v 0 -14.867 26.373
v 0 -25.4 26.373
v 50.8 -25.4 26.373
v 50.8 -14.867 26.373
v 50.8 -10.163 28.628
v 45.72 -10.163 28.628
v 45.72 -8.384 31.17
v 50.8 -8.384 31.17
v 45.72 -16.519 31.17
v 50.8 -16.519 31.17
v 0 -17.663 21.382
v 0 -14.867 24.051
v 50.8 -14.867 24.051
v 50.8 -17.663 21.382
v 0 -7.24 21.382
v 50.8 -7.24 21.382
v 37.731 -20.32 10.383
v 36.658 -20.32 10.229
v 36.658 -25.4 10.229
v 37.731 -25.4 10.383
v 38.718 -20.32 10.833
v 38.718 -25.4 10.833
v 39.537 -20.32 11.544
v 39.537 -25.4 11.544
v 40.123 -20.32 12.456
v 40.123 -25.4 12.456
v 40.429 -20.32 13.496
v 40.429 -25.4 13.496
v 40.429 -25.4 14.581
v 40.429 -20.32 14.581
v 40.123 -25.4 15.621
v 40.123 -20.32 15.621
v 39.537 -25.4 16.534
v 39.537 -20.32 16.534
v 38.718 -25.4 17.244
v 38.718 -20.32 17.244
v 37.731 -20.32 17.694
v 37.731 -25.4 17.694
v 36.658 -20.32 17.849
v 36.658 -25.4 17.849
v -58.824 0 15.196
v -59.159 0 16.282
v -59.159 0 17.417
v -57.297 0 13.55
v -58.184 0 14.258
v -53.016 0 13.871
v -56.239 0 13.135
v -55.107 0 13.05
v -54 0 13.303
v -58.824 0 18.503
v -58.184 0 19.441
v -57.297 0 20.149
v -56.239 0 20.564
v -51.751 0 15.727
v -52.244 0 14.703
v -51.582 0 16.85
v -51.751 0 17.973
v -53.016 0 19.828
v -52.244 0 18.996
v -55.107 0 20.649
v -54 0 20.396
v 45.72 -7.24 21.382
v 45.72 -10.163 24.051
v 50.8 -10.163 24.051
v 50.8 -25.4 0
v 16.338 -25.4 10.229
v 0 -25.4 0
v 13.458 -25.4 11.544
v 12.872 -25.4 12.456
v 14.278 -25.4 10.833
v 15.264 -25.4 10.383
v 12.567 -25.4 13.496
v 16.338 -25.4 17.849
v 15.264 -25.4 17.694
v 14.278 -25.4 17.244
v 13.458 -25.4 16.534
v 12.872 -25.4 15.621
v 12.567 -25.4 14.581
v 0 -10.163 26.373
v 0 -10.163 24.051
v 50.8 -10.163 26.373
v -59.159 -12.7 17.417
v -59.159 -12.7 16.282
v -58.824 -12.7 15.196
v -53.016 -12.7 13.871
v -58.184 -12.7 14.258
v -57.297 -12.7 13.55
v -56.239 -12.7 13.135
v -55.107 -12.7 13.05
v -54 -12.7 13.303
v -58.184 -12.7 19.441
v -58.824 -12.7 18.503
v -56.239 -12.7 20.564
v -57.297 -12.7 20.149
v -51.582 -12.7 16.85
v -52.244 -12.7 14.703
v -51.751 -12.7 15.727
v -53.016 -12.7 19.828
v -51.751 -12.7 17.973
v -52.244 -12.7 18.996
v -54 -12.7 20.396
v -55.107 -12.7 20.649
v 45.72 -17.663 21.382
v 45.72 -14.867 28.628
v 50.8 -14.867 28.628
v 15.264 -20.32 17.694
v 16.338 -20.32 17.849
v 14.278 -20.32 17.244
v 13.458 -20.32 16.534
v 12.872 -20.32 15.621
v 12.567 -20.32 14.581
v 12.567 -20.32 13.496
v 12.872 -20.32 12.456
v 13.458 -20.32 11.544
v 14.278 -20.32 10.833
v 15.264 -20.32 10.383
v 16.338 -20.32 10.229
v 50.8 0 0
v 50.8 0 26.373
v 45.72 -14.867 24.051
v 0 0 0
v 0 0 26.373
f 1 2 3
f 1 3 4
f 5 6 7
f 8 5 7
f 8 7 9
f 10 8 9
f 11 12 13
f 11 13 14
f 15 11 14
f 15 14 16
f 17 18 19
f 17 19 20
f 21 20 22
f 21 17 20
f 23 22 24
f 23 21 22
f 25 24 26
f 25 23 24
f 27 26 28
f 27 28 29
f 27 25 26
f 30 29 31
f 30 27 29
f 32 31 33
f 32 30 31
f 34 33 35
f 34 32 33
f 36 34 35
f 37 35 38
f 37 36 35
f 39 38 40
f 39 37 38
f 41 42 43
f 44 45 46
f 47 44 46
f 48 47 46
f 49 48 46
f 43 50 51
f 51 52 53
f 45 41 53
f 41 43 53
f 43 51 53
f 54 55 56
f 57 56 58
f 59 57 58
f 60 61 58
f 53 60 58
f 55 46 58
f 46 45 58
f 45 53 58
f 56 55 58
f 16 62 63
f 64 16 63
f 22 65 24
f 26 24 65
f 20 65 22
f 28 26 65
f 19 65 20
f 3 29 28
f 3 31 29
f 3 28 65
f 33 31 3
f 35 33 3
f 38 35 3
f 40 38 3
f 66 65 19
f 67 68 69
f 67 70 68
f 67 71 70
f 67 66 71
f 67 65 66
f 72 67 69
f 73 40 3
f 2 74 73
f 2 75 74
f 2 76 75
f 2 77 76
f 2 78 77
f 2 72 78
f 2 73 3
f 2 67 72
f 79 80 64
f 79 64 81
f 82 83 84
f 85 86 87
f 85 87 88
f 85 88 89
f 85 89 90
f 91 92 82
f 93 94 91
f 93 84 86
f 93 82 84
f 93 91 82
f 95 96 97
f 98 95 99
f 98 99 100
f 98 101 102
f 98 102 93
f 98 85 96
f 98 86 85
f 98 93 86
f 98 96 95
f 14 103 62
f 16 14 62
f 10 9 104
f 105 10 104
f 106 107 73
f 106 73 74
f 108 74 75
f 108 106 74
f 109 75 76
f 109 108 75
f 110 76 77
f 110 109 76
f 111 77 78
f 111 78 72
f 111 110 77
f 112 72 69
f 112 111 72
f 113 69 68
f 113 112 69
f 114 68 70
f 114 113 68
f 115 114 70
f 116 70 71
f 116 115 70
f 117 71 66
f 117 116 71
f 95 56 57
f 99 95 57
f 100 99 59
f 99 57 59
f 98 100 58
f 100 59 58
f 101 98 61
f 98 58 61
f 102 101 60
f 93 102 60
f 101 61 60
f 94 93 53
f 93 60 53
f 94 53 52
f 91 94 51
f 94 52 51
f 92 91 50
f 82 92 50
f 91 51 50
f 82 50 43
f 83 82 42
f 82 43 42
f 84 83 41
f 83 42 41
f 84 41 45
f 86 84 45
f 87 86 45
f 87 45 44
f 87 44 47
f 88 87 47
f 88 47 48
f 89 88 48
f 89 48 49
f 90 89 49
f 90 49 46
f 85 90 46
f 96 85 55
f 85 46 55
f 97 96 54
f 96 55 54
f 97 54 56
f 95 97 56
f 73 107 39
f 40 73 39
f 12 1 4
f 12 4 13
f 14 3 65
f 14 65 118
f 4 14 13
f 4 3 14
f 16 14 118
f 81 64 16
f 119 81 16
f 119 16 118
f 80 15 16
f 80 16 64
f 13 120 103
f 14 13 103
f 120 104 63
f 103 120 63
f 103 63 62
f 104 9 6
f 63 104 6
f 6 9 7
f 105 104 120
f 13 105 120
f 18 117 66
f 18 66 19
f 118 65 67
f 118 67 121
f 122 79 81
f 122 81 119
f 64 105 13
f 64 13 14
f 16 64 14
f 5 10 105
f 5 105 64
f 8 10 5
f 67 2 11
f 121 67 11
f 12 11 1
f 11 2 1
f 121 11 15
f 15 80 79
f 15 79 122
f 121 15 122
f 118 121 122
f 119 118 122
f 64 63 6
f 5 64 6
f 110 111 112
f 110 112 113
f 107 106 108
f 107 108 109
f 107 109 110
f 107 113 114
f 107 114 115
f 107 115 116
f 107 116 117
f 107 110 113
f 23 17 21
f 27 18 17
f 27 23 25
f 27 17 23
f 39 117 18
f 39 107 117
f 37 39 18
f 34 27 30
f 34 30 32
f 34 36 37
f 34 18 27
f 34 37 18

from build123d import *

# Parameters (mm, degrees)
F0_W     = 25.4
F0_H     = 26.373182479
F1_DEPTH = 50.8
F3_DEPTH = 50.8
F5_DEPTH = 45.72
F6_R     = 3.81
F7_DEPTH = 12.7
F8_W     = 20.32
F8_H     = 7.62
F9_DEPTH = 5.08


with BuildPart() as f1:
    # F0 (on Right) → F1 (new body)
    with BuildSketch(Plane.YZ):
        with Locations((-12.7, 13.1865912395)):
            Rectangle(F0_W, F0_H)
    extrude(amount=F1_DEPTH)


with BuildPart() as f3:
    # F2 (on Right) → F3 (new body)
    with BuildSketch(Plane.YZ):
        Polygon((-10.1633993909, 28.6276564002), (-8.3837173879, 31.1700608581), (-16.5194068104, 31.1700608581), (-14.8668456823, 28.6276564002), (-14.8668456823, 24.0513309836), (-17.6634881645, 21.3818084449), (-7.2396355681, 21.3818084449), (-10.1633993909, 24.0513309836), align=None)
    extrude(amount=F3_DEPTH)


with BuildPart() as f1_1:
    add(f1.part)

    # F4: cut F3
    add(f3.part, mode=Mode.SUBTRACT)


with BuildPart() as f3_1:
    add(f3.part)

    # F5 (cut): a face of the model
    f5_faces = [f3_1.faces().sort_by_distance(p)[0] for p in [
        (0, -12.4929387218, 26.0533462896),
    ]]
    extrude(f5_faces, amount=-F5_DEPTH, mode=Mode.SUBTRACT)


with BuildPart() as f7:
    # F6 (on Front) → F7 (new body)
    with BuildSketch(Plane.XZ):
        with Locations((-55.3915388882, 16.8495215476)):
            Circle(F6_R)
    extrude(amount=F7_DEPTH)


with BuildPart() as f9:
    # F8 (on Front) → F9 (new body)
    with BuildSketch(Plane.XZ):
        with Locations((-46.6563001151, 5.2465574117)):
            Rectangle(F8_W, F8_H)
        with BuildLine():
            ThreePointArc((-36.4963001151, 1.4365574117), (-32.6863001151, 5.2465574117), (-36.4963001151, 9.0565574117))
            Line((-36.4963001151, 9.0565574117), (-36.4963001151, 1.4365574117))
        make_face()
        with BuildLine():
            Line((-56.8163001151, 1.4365574117), (-56.8163001151, 9.0565574117))
            ThreePointArc((-56.8163001151, 9.0565574117), (-60.6263001151, 5.2465574117), (-56.8163001151, 1.4365574117))
        make_face()
    extrude(amount=F9_DEPTH)


with BuildPart() as f9_1:
    # F10: moved
    add(f9.part.moved(Location((73.15403, -20.32, 8.79203))))


with BuildPart() as f1_2:
    add(f1_1.part)

    # F11: cut F9
    add(f9_1.part, mode=Mode.SUBTRACT)


solid = Compound([f3_1.part, f7.part, f1_2.part])
